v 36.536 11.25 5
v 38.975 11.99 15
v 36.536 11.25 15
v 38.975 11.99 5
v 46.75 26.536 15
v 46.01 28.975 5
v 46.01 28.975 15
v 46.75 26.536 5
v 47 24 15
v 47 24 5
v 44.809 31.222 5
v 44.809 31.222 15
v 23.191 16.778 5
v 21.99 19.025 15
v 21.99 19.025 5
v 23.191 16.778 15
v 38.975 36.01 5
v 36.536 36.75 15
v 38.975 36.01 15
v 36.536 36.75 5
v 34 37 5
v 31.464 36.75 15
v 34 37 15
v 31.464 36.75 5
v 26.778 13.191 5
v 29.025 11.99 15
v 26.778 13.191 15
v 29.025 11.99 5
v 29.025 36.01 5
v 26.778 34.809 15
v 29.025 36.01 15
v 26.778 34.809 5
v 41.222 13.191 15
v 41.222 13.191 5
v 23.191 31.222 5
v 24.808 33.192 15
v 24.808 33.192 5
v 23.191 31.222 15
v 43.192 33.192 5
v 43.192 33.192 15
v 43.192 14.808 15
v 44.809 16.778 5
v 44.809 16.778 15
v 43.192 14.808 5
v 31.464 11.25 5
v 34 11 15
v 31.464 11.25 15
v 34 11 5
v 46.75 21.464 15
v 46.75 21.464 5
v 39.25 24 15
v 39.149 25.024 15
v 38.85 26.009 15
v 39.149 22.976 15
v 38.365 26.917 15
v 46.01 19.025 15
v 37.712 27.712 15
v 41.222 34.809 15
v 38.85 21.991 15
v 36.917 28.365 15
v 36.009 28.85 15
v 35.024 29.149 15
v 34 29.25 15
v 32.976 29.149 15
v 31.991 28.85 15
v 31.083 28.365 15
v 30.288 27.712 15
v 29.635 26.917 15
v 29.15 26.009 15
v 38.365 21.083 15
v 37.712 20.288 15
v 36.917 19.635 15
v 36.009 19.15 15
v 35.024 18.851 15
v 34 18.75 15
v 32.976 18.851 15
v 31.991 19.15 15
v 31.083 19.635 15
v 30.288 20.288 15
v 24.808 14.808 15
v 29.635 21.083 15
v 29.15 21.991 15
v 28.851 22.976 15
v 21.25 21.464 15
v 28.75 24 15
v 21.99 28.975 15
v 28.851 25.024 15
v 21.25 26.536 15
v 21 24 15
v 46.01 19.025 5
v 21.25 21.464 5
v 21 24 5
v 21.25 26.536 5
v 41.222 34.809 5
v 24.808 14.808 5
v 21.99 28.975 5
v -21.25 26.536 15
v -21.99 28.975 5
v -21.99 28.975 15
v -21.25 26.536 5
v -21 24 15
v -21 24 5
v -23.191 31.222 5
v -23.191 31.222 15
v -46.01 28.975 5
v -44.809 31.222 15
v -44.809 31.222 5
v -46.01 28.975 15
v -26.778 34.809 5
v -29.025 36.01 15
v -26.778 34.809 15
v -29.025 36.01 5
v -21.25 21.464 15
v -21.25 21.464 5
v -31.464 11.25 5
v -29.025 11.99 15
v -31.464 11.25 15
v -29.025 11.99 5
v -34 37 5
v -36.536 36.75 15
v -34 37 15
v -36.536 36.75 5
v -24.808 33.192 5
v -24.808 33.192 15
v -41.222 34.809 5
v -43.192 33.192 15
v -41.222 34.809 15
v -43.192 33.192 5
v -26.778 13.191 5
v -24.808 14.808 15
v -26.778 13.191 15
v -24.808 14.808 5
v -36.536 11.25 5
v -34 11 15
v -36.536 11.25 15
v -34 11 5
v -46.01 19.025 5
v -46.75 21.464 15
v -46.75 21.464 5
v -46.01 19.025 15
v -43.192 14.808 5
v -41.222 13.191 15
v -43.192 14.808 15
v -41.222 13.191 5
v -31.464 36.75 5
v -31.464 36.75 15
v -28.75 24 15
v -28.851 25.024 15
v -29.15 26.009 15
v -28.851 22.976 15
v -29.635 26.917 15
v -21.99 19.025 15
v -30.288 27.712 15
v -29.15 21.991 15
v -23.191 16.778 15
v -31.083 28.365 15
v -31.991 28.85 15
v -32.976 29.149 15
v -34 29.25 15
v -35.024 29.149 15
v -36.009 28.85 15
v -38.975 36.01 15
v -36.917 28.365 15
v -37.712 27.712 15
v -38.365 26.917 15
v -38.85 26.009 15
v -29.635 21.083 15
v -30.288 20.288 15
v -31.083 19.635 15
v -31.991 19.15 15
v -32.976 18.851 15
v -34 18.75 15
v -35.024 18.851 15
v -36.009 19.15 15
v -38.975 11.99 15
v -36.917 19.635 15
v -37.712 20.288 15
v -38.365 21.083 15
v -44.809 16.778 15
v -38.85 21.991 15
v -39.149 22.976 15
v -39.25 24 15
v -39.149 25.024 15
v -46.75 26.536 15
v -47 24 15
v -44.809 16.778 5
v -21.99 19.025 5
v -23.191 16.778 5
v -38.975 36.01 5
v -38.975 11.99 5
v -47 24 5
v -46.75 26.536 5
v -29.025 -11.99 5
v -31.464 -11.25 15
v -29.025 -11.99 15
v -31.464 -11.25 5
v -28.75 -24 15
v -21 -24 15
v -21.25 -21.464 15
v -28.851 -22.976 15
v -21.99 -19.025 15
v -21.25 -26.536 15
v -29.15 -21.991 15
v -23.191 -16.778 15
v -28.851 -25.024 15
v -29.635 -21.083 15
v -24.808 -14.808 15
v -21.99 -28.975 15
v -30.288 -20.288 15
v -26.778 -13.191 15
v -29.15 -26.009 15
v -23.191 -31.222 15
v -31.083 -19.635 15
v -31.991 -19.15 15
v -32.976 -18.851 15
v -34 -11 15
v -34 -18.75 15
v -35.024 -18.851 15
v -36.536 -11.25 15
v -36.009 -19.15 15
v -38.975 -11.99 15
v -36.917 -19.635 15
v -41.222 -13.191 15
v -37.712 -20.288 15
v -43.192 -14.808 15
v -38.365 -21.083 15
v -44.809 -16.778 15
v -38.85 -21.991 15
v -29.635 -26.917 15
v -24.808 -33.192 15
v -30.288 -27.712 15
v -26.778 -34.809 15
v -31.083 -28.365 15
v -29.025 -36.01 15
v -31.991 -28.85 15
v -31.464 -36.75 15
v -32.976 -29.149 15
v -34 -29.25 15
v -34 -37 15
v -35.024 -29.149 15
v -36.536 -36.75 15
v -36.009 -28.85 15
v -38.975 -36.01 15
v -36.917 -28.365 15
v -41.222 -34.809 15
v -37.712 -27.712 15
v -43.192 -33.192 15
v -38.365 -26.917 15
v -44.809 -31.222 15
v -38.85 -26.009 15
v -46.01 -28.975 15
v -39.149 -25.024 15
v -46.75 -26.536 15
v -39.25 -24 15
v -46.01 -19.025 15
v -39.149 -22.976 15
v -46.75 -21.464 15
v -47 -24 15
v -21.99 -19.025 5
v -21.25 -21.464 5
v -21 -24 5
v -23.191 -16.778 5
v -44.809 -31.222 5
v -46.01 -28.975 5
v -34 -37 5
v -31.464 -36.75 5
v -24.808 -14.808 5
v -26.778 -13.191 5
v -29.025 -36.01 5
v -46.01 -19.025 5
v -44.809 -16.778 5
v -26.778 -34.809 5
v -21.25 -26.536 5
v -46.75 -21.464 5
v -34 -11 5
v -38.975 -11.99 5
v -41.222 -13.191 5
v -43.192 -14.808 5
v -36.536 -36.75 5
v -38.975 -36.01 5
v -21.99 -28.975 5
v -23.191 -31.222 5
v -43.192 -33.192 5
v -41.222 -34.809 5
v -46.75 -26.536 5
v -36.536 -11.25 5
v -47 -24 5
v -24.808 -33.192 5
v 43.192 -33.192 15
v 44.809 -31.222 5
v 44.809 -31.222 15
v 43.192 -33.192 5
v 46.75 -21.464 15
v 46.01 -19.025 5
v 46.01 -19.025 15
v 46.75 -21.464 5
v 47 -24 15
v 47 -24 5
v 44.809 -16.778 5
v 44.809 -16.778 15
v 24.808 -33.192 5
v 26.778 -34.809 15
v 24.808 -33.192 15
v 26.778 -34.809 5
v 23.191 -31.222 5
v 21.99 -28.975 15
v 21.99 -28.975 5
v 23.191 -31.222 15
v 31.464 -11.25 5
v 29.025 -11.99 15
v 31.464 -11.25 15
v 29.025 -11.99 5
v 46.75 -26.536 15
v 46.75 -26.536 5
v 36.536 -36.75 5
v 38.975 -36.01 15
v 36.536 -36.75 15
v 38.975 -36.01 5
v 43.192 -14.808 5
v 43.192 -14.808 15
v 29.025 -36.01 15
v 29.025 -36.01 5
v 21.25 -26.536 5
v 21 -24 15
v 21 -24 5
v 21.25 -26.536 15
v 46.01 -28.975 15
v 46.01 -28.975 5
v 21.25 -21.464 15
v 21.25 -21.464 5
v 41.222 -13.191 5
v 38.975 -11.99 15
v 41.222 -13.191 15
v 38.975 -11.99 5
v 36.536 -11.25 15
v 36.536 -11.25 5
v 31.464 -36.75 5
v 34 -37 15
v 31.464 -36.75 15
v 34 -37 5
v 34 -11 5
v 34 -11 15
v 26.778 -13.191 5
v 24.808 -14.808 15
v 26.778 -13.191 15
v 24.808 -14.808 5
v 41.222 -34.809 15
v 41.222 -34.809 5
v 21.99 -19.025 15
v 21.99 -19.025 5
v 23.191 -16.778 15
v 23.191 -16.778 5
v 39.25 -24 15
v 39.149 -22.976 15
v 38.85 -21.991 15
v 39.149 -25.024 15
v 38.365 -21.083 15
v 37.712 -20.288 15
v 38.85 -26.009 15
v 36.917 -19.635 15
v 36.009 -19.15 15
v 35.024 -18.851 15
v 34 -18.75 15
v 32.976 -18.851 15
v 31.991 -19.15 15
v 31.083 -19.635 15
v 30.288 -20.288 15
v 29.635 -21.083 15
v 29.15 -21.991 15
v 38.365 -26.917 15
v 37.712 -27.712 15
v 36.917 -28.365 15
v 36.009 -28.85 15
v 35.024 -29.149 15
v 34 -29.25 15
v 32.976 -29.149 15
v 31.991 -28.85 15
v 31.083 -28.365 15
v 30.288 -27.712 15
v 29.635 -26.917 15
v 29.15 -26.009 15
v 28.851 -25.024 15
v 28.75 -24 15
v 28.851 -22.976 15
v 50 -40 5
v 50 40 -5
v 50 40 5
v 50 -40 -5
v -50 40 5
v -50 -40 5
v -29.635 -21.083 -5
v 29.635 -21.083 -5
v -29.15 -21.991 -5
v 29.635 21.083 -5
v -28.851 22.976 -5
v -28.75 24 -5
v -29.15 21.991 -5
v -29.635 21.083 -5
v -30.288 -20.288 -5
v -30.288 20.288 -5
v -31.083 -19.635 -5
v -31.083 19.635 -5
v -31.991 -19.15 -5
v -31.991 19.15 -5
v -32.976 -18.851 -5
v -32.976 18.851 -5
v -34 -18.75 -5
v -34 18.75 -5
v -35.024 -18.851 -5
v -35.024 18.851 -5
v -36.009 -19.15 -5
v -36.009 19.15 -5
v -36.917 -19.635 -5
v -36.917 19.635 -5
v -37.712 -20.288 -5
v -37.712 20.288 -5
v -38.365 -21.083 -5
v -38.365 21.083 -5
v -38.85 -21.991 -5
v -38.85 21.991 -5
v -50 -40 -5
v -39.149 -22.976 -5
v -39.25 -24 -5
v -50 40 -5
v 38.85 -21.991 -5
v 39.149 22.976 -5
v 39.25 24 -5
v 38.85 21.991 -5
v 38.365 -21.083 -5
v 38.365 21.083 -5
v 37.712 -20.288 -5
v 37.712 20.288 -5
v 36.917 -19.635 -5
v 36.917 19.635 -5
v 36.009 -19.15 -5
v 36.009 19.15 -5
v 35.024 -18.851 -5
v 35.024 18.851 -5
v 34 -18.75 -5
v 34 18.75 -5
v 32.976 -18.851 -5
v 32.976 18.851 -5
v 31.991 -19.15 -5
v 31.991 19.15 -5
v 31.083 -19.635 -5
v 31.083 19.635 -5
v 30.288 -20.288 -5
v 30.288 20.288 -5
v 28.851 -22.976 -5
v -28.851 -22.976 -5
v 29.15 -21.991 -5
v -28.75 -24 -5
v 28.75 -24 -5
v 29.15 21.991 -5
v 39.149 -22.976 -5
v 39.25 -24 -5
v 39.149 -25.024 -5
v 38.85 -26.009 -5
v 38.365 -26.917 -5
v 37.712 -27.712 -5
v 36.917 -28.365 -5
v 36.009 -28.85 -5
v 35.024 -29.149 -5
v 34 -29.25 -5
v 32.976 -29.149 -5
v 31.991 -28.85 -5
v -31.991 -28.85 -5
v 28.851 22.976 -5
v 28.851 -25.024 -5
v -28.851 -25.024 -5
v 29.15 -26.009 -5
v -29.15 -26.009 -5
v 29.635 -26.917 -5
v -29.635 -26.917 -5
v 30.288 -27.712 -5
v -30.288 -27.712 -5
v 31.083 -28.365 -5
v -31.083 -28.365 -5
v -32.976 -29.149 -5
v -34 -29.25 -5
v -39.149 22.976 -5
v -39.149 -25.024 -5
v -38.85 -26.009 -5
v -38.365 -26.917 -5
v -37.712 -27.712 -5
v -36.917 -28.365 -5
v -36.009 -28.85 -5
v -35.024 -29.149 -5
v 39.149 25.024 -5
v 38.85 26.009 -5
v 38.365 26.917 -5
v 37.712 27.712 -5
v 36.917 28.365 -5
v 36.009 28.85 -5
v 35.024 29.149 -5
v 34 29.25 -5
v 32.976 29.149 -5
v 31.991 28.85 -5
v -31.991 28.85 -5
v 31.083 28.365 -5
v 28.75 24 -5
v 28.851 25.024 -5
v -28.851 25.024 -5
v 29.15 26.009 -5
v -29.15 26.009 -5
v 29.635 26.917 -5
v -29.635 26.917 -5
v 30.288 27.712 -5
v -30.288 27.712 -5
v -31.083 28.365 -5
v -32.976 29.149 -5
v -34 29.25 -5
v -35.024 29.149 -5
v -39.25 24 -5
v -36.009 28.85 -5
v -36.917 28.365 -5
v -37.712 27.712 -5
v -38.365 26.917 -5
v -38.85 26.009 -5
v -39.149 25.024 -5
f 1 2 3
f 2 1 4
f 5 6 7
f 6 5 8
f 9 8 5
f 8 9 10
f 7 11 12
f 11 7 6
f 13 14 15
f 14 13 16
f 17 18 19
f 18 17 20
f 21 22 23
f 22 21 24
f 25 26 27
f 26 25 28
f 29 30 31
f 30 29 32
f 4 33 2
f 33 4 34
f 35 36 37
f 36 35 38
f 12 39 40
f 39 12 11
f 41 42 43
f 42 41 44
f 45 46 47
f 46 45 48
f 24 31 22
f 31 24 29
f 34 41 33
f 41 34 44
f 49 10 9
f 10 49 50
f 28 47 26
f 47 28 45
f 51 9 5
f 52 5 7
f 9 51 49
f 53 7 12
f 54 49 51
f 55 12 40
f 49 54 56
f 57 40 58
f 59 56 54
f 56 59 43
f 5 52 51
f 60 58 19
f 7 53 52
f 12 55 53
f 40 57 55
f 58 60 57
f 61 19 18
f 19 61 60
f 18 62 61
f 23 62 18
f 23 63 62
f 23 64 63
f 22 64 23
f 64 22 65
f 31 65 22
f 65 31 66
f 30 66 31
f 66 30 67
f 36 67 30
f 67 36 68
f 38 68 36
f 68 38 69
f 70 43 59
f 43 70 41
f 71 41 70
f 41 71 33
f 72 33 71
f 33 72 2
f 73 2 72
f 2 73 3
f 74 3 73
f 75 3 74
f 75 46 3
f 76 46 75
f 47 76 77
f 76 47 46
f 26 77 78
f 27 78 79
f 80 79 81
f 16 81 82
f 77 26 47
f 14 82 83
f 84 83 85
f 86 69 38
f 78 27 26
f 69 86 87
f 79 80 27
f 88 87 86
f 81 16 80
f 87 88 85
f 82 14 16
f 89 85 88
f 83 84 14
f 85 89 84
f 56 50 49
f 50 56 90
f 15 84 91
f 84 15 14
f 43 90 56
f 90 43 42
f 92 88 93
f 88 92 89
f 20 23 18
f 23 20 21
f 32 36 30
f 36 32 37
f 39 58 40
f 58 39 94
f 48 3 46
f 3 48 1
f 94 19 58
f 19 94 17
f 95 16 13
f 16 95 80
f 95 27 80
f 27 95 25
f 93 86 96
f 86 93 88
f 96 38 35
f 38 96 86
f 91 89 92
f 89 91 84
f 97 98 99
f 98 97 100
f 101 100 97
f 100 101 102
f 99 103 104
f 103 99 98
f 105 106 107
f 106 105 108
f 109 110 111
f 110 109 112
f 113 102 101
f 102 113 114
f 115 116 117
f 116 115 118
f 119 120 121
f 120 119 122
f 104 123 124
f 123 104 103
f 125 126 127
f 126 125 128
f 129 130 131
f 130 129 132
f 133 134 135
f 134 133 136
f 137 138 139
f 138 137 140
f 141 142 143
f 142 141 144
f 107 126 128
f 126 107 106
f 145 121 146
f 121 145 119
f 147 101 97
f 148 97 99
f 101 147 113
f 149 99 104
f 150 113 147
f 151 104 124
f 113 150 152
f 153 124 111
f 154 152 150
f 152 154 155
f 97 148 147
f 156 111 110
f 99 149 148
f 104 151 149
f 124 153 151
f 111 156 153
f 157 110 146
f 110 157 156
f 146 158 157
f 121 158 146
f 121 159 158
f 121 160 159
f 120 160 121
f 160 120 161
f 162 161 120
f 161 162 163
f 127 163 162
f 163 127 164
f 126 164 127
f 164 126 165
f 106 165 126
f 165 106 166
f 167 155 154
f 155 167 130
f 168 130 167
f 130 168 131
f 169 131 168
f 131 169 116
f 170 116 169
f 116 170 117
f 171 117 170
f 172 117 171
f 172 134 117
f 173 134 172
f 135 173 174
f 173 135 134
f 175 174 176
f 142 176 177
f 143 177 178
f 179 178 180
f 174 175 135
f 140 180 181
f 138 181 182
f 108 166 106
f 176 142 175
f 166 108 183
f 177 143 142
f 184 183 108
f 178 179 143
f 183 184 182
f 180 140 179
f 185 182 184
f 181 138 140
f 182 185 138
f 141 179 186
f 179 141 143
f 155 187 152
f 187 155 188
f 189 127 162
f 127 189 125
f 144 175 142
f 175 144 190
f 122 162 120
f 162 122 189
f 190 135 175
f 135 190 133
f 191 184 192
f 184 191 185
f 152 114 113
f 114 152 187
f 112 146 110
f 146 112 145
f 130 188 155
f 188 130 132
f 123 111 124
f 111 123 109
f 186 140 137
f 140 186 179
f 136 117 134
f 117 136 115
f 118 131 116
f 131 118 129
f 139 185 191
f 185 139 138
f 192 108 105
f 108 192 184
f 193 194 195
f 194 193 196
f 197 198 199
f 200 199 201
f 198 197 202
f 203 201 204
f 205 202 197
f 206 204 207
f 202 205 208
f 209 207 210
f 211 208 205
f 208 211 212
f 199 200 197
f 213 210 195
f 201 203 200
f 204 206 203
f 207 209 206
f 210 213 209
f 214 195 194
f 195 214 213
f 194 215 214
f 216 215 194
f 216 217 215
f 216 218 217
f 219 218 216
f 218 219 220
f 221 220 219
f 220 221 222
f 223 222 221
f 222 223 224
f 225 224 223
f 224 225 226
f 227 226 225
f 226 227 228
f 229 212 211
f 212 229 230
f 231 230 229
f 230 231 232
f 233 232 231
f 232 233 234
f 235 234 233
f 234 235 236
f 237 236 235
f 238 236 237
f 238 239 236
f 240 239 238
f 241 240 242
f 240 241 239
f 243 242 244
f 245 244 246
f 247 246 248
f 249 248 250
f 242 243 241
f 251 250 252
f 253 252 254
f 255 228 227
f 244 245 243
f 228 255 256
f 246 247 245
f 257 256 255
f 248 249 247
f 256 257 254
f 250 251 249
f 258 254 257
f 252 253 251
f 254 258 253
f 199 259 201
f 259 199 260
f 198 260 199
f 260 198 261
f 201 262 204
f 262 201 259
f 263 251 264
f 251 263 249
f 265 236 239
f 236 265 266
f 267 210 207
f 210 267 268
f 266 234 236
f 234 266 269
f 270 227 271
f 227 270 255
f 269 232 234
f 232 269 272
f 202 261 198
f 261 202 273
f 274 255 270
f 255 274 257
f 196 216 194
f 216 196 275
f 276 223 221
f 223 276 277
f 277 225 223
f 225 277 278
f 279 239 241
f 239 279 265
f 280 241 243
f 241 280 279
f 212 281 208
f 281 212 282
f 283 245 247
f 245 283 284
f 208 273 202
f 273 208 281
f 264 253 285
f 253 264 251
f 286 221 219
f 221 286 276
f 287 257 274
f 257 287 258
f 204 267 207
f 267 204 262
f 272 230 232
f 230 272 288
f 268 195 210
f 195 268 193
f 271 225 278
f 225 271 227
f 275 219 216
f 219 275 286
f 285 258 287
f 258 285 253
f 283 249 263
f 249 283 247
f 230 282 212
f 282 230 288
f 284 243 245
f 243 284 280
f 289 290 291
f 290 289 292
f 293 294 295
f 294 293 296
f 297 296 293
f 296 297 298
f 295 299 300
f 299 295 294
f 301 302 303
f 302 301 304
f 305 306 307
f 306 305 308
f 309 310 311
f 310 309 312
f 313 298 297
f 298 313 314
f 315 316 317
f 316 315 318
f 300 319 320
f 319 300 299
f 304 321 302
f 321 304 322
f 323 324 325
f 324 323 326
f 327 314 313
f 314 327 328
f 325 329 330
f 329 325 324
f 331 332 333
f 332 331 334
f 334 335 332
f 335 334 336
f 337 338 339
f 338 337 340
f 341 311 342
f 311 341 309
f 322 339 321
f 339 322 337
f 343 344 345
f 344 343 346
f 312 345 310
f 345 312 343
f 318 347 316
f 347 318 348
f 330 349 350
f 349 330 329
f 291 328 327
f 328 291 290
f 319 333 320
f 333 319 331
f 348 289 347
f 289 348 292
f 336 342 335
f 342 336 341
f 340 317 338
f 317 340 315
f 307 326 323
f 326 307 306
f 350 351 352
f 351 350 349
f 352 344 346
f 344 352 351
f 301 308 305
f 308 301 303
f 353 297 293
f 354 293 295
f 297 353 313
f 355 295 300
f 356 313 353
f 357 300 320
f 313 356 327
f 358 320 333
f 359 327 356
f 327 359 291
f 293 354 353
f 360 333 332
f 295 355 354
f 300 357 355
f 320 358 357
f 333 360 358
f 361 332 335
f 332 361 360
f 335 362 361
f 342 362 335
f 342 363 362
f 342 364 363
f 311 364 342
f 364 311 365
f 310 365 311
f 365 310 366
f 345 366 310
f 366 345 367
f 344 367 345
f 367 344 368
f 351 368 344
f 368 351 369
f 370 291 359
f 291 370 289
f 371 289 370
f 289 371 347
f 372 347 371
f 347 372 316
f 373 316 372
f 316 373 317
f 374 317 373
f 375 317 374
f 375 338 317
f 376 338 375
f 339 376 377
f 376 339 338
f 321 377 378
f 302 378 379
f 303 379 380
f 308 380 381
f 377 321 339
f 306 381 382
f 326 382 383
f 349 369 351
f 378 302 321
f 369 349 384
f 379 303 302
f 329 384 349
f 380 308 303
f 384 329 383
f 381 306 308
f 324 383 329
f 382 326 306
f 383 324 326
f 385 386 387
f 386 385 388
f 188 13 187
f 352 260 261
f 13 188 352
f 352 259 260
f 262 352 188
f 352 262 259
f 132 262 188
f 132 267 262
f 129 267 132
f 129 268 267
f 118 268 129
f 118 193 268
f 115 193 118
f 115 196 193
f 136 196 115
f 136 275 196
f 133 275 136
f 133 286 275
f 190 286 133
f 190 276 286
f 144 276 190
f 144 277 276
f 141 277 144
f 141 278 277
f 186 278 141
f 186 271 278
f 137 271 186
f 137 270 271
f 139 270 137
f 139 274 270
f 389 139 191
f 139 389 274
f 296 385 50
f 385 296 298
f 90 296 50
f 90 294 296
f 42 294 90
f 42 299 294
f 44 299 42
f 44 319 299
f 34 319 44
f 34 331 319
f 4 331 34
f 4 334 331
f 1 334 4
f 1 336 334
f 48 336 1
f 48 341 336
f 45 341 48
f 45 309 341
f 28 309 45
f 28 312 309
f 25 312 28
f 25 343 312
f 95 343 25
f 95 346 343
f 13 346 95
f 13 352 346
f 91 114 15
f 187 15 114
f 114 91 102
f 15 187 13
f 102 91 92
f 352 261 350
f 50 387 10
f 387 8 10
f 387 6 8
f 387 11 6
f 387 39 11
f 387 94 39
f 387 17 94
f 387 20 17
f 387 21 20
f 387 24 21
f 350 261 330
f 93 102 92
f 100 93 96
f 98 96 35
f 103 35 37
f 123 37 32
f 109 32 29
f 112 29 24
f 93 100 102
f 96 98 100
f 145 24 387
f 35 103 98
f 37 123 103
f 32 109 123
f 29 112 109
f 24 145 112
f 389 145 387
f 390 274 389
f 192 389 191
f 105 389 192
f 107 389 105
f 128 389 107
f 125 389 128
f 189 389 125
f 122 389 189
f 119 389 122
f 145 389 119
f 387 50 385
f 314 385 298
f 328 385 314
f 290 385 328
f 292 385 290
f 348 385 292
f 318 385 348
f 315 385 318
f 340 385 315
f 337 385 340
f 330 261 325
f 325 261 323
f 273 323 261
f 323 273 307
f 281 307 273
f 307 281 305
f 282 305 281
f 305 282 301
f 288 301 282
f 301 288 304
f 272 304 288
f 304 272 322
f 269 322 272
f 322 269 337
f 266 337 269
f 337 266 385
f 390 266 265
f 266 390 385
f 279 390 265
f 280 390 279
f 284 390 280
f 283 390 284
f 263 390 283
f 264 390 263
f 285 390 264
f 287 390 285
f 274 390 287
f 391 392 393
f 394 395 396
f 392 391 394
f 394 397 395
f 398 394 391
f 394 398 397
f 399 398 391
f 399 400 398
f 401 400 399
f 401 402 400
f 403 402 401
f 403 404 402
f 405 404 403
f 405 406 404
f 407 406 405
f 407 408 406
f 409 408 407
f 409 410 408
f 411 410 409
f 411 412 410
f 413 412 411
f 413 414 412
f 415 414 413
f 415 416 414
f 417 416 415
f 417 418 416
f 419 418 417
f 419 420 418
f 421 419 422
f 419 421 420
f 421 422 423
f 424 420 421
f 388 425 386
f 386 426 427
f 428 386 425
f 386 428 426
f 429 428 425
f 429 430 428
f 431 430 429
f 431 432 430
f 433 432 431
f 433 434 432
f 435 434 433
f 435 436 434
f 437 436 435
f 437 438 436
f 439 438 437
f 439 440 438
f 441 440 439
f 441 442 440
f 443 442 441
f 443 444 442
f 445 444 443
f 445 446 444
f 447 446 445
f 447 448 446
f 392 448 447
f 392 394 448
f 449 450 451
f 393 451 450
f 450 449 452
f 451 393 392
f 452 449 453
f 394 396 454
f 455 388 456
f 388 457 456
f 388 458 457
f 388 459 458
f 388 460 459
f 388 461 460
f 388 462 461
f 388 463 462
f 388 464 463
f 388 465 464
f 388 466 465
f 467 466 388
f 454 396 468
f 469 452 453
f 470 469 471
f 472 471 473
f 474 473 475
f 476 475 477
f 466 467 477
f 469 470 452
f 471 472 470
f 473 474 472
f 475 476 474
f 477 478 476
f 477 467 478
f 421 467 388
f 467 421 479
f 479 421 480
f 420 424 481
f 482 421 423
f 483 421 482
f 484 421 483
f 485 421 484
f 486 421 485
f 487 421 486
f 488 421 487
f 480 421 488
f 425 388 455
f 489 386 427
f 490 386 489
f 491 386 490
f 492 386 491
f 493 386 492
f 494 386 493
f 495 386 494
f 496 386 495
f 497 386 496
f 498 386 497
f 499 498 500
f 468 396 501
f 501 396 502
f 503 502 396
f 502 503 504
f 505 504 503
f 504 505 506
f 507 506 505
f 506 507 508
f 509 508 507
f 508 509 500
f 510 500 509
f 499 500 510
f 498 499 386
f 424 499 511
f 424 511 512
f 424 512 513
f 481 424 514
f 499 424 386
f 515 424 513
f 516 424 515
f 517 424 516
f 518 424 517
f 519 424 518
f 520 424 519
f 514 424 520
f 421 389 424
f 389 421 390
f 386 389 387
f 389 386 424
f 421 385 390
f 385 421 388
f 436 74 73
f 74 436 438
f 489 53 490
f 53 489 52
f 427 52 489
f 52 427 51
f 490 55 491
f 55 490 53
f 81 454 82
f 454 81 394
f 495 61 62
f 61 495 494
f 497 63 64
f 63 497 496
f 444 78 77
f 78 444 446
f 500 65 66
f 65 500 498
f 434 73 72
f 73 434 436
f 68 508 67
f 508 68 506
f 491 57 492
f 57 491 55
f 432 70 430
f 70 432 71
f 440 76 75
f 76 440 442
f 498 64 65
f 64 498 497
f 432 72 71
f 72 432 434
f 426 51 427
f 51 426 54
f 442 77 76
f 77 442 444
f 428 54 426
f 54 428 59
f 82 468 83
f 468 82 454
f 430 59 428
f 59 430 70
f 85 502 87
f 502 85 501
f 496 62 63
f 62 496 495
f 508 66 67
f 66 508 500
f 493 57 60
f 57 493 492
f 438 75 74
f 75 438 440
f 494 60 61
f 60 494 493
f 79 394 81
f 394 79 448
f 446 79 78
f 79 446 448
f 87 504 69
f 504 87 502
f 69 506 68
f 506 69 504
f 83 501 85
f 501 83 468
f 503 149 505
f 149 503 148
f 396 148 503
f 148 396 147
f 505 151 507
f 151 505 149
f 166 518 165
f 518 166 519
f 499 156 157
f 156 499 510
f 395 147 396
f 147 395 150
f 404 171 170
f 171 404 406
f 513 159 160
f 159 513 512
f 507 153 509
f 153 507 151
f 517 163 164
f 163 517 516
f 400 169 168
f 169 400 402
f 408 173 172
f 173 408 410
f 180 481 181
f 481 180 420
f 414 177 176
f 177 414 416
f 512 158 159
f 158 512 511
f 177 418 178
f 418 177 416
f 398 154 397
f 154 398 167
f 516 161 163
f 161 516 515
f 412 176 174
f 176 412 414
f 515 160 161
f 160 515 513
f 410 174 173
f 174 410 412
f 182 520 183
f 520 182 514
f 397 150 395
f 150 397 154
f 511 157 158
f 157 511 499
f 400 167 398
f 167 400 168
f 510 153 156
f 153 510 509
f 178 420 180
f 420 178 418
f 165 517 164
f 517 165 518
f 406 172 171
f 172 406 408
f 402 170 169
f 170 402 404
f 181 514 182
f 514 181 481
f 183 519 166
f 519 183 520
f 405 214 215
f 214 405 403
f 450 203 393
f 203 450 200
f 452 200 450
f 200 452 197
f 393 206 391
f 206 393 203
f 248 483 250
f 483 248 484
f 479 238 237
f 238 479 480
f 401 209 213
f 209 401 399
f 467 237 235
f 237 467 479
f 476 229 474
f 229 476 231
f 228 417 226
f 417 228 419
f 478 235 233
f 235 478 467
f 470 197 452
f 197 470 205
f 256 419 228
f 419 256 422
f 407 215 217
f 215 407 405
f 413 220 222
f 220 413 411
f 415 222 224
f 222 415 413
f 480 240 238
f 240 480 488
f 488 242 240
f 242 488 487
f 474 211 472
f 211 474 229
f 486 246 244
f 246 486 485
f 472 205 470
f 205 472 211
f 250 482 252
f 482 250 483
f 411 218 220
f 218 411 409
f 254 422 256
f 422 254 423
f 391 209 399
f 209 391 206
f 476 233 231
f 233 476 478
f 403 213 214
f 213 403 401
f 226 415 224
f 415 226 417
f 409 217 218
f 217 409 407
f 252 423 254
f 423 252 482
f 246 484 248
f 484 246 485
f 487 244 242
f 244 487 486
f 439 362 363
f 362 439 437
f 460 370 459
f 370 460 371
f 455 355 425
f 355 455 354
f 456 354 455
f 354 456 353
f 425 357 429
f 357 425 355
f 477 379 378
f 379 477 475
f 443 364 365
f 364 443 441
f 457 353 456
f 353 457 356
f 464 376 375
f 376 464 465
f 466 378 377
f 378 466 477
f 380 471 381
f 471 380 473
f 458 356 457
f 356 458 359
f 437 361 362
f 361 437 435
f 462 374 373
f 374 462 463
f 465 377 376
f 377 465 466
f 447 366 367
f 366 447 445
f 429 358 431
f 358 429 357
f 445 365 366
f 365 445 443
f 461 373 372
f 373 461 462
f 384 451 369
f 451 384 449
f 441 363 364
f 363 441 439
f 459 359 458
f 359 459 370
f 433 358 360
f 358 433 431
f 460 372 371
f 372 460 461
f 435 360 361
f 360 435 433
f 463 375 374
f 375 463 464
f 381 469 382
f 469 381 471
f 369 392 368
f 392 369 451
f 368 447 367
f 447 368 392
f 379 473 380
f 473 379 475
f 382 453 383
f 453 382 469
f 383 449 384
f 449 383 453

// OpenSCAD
$fn = 32;

// ----------------------------------------------------------------------
// Anchor pads 100 x 80 x 20
// four corner bosses with anchor holes
// ----------------------------------------------------------------------

// --- parameters (mm) ---
plate = [100, 80, 10];  // base plate size (x, y, z)
pads = 4;               // boss count, one per corner
edge = 16;              // boss centre offset from the plate edge
boss_d = 26;            // boss diameter
boss_h = 10;            // boss height above the base plate
hole_d = 10.5;          // hole diameter

// --- derived feature positions (mm) ---
height = plate[2] + boss_h;      // = 20   overall height of the part
corner_x = plate[0] / 2 - edge;  // = 34   boss centre X
corner_y = plate[1] / 2 - edge;  // = 24   boss centre Y
feature_centers = [
  [corner_x, corner_y],
  [-corner_x, corner_y],
  [-corner_x, -corner_y],
  [corner_x, -corner_y]
];   // boss centres, anchor holes are drilled there

// base plate, four bosses standing on it, anchor holes all the way through
difference() {
  union() {
    cube(plate, center = true);
    for (centre = feature_centers)
      translate([centre[0], centre[1], plate[2] / 2 - 1])
        cylinder(d = boss_d, h = boss_h + 1);
  }
  for (centre = feature_centers)
    translate([centre[0], centre[1], -height])
      cylinder(d = hole_d, h = 2 * height + 2);  // through boss and plate
}
